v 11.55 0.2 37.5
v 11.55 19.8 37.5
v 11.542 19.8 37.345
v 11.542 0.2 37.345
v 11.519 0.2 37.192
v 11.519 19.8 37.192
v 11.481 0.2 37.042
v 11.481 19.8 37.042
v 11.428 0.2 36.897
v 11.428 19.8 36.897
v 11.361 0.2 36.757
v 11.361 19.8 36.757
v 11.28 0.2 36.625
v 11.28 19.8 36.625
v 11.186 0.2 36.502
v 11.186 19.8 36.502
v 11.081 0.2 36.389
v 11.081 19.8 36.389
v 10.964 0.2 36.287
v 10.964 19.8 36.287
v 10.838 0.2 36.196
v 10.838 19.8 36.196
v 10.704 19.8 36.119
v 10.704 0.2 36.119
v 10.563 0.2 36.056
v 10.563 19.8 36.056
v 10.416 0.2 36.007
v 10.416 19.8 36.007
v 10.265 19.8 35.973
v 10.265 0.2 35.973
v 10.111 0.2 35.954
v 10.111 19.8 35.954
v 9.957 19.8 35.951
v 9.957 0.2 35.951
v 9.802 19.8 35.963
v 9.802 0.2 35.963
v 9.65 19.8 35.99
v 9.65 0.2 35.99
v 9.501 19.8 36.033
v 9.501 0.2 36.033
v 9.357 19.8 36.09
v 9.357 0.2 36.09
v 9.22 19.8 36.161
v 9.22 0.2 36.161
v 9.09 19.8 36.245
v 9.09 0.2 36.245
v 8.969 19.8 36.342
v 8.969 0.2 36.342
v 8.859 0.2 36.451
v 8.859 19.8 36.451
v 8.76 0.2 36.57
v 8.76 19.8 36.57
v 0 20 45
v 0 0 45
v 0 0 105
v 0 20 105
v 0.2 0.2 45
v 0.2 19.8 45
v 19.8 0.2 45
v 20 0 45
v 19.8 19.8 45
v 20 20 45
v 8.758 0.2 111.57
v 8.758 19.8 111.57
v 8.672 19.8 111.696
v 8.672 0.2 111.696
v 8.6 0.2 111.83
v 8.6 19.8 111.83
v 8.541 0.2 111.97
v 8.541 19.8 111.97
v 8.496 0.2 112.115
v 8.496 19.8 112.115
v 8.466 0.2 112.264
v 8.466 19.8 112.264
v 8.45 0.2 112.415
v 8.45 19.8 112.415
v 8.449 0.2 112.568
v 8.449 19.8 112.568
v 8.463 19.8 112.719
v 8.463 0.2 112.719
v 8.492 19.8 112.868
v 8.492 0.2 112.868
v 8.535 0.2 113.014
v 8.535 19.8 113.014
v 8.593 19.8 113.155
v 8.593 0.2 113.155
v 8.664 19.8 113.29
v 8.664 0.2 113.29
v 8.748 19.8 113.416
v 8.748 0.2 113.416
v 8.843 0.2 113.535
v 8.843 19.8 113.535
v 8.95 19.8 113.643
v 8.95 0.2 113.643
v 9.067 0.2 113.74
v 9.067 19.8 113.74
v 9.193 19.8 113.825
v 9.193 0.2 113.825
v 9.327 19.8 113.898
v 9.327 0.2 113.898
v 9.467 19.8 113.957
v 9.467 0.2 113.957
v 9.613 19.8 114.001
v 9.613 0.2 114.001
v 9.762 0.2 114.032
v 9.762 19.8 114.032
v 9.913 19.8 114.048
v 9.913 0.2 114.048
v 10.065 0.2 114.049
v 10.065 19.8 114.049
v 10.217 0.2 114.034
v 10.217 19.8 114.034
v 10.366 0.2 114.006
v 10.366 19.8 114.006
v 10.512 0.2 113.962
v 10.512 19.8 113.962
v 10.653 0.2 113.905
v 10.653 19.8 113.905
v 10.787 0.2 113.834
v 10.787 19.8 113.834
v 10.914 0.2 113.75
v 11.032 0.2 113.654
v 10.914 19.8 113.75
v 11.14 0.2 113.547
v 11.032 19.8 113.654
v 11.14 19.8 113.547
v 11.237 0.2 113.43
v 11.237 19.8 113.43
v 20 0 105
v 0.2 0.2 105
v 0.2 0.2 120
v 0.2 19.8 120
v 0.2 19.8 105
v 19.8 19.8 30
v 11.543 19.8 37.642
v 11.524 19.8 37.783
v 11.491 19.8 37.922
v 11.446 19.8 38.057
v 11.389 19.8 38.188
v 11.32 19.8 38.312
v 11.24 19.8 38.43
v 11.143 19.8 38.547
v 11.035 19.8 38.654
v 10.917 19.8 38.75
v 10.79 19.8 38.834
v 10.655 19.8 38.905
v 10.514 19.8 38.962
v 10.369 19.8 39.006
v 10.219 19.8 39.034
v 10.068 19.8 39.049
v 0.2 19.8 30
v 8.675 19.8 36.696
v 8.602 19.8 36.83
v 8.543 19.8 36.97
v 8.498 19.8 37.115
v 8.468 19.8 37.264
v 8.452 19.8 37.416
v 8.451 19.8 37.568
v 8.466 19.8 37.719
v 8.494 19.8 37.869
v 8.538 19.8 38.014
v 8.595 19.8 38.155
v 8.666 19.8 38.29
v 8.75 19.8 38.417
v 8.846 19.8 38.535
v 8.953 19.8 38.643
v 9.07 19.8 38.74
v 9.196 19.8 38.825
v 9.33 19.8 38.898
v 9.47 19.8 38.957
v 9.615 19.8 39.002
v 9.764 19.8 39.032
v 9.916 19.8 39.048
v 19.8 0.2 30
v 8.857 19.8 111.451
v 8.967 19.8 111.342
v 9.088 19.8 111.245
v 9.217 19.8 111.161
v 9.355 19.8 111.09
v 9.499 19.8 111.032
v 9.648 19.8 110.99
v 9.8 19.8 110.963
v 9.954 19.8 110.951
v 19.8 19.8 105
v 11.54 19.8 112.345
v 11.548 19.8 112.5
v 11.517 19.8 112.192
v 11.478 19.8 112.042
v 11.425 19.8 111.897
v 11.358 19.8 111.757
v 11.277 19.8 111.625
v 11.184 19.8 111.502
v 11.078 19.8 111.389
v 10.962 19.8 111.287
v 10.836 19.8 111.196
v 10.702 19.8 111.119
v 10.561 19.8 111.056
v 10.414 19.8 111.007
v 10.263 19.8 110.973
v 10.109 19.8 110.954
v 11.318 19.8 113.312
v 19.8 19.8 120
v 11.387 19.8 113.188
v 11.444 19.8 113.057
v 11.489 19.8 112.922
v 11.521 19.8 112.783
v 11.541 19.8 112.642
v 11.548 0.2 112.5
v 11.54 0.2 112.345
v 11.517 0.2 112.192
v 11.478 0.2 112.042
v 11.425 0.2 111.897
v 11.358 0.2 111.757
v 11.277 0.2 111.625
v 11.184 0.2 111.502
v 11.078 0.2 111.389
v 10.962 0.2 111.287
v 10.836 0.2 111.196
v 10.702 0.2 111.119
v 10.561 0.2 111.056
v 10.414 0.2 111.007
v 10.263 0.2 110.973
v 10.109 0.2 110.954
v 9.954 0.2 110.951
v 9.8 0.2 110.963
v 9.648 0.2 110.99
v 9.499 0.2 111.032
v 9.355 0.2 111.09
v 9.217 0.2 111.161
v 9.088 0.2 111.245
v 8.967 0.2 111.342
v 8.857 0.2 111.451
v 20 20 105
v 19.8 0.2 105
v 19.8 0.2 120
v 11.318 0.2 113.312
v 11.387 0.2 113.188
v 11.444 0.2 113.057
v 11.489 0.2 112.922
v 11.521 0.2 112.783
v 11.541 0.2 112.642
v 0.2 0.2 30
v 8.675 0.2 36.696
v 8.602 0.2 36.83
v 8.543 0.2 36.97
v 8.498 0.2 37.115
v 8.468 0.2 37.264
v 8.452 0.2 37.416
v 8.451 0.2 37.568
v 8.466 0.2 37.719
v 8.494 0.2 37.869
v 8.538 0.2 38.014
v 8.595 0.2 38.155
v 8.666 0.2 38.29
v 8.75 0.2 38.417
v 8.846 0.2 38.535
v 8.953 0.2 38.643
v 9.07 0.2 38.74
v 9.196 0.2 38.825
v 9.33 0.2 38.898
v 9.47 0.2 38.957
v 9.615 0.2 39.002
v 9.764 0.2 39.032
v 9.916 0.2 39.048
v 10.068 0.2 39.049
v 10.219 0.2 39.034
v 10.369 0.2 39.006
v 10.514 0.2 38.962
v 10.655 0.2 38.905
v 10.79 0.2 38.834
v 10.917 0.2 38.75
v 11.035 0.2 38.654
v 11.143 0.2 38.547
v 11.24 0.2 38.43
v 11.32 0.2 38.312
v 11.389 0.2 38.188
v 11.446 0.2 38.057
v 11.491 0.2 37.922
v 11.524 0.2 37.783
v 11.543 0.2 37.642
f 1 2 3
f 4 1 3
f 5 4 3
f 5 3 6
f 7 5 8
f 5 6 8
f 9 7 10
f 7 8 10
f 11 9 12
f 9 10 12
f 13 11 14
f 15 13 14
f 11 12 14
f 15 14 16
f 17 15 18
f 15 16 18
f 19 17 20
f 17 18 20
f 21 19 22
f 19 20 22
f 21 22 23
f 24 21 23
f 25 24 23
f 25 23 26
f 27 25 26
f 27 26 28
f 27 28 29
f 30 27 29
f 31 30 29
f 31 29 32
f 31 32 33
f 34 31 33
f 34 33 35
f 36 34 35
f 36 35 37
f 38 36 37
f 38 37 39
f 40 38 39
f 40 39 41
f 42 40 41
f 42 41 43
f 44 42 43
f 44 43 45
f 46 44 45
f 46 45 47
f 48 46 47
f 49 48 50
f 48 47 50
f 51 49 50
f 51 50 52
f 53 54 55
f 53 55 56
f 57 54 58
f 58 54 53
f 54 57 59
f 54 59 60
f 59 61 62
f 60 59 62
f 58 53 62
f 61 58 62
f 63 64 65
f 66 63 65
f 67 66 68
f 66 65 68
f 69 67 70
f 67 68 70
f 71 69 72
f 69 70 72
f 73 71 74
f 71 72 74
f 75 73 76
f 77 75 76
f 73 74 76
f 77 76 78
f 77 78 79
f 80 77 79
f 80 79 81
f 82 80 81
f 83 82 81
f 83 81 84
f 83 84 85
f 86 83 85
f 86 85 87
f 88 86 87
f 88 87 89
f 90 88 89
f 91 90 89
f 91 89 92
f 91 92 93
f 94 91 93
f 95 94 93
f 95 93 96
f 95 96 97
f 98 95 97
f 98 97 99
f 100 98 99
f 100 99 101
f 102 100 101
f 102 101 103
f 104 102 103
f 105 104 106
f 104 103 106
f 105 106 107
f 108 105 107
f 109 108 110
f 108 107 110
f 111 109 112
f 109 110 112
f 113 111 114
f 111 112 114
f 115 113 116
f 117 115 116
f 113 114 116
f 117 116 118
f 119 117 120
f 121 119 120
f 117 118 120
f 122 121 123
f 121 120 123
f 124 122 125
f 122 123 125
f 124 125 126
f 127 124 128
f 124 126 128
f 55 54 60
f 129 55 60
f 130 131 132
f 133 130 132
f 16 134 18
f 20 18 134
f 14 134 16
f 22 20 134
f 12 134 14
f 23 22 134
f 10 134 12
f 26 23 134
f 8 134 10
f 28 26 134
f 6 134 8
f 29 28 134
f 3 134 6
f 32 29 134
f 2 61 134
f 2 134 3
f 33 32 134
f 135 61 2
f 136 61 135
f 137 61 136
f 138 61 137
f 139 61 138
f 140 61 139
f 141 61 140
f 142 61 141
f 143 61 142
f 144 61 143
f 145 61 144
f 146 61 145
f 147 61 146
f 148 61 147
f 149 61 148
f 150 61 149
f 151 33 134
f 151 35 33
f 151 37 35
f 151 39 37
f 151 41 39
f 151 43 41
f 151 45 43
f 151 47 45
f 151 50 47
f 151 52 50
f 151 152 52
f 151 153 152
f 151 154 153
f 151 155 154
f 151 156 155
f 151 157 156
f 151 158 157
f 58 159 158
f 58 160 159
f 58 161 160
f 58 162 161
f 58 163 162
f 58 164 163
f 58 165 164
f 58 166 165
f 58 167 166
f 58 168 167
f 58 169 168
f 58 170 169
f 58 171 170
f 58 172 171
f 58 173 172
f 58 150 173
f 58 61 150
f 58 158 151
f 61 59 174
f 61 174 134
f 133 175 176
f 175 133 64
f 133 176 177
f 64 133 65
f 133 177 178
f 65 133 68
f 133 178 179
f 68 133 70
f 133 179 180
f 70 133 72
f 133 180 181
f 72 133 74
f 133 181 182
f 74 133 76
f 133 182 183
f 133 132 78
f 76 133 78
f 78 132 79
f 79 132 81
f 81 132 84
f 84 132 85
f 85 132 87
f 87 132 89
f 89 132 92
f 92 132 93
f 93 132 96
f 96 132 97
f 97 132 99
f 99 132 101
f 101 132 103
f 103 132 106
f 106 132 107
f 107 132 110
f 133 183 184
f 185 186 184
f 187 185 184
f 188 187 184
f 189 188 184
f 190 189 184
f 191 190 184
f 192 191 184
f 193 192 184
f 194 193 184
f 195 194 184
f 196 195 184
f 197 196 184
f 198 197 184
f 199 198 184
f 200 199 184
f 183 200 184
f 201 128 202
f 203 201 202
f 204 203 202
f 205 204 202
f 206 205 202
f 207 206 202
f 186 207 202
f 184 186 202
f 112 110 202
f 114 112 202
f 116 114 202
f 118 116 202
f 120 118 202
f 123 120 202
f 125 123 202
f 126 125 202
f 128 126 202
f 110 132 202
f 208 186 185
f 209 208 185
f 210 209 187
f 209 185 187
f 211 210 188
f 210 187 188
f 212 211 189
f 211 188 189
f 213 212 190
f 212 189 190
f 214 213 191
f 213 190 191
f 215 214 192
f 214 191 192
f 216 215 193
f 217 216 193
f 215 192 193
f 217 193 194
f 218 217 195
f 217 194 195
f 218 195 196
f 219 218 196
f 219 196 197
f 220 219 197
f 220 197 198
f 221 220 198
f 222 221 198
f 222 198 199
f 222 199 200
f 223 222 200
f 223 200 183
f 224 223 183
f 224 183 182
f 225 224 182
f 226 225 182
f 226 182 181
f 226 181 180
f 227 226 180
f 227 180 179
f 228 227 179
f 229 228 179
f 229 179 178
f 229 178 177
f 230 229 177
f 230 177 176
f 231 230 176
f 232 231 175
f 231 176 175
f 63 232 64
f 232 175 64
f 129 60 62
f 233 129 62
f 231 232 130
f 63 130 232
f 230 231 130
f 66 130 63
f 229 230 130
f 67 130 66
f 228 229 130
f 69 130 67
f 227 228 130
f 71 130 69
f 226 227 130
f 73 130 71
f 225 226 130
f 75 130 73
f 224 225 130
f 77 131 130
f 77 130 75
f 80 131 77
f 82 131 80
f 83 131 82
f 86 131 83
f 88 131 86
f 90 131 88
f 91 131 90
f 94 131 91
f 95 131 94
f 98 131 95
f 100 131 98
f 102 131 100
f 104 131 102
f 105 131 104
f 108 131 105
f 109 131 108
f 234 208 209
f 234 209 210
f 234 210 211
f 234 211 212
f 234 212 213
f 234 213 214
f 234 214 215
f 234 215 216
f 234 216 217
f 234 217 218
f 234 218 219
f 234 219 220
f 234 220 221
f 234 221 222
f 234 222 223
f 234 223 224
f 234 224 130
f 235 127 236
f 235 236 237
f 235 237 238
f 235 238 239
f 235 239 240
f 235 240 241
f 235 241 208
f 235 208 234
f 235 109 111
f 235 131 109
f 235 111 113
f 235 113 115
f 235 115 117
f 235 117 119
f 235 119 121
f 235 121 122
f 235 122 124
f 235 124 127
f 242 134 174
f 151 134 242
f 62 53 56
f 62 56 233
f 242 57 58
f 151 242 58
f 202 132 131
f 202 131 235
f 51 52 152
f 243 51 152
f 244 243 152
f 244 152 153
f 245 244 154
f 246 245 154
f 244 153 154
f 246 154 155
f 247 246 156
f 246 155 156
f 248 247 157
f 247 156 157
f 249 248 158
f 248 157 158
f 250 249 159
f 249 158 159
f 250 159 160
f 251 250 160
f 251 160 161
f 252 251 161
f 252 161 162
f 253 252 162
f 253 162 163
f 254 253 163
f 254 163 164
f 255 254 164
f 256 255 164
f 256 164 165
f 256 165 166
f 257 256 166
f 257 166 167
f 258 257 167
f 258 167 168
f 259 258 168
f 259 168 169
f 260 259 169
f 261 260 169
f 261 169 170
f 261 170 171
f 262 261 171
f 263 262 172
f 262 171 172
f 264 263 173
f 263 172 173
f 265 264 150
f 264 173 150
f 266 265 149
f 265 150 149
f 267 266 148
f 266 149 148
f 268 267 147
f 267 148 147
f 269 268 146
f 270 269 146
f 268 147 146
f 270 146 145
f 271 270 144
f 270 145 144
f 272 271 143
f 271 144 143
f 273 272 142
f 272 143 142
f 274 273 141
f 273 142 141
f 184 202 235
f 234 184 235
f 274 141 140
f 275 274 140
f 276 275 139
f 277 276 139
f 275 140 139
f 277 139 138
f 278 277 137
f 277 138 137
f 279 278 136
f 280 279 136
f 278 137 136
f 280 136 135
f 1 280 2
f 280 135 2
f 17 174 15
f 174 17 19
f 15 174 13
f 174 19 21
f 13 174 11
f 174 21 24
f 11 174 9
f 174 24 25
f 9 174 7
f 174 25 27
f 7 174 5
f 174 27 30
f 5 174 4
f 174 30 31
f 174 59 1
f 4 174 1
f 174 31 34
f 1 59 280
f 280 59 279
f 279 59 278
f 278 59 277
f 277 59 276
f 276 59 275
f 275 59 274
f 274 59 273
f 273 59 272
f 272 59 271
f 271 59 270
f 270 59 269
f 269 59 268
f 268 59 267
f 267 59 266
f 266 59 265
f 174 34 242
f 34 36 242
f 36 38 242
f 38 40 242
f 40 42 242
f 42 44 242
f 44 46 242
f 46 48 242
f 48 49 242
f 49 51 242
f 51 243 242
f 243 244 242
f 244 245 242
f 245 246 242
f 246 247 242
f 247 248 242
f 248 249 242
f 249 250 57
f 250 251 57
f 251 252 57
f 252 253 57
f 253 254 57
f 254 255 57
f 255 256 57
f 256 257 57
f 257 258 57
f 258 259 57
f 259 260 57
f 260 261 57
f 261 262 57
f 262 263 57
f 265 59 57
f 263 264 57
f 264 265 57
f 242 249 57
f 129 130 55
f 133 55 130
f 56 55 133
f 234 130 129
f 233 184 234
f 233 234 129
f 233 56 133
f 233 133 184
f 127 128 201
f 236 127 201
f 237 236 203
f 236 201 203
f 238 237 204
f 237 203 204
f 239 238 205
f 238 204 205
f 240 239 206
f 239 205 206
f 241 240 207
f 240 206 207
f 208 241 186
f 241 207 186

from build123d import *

# Parameters (mm, degrees)
SKETCH_1_W          = 20
SKETCH_1_H          = 20
EXTRUDE_1_DEPTH     = 120
SKETCH_2_W          = 10
SKETCH_2_H          = 20
CUT_EXTRUDE_1_DEPTH = 120
CUT_EXTRUDE_2_DEPTH = 120
SKETCH_4_R          = 3
CUT_EXTRUDE_3_DEPTH = 2
SKETCH_8_W          = 19.6
SKETCH_8_H          = 0.2
SKETCH_8_W_2        = 0.2
SKETCH_8_H_2        = 19.6
CUT_EXTRUDE_6_DEPTH = 15
SKETCH_9_W          = 10
SKETCH_9_H          = 20
CUT_EXTRUDE_7_DEPTH = 20
SKETCH_10_W         = 19.6
SKETCH_10_H         = 19.6
EXTRUDE_2_DEPTH     = 15
CUT_EXTRUDE_8_DEPTH = 20
CUT_EXTRUDE_9_DEPTH = 20


with BuildPart() as part:
    # 草图1 → 凸台-拉伸1 (new body)
    with BuildSketch(Plane.XY):
        with Locations((10, 10)):
            Rectangle(SKETCH_1_W, SKETCH_1_H)
    extrude(amount=EXTRUDE_1_DEPTH)

    # 草图2 → 切除-拉伸1 (cut)
    with BuildSketch(Plane(origin=(0, 20, 0), x_dir=(1, 0, 0), z_dir=(0, 1, 0))):
        with Locations((15, -10)):
            Rectangle(SKETCH_2_W, SKETCH_2_H)
    extrude(amount=-CUT_EXTRUDE_1_DEPTH, mode=Mode.SUBTRACT)

    # 草图3 → 切除-拉伸2 (cut)
    with BuildSketch(Plane(origin=(10, 0, 0), x_dir=(0, 0, -1), z_dir=(1, 0, 0))):
        with BuildLine():
            ThreePointArc((-8.45, 10), (-9.40684068, 11.432013275), (-11.096015511, 11.096015511))
            Line((-11.096015511, 11.096015511), (-8.903984489, 8.903984489))
            ThreePointArc((-8.903984489, 8.903984489), (-8.567986725, 9.40684068), (-8.45, 10))
        make_face()
        with BuildLine():
            Line((-8.903984489, 8.903984489), (-11.096015511, 11.096015511))
            ThreePointArc((-11.096015511, 11.096015511), (-11.096015511, 8.903984489), (-8.903984489, 8.903984489))
        make_face()
    extrude(amount=-CUT_EXTRUDE_2_DEPTH, mode=Mode.SUBTRACT)

    # 草图4 → 切除-拉伸3 (cut)
    with BuildSketch(Plane.ZY):
        with Locations((10, 10)):
            Circle(SKETCH_4_R)
    extrude(amount=-CUT_EXTRUDE_3_DEPTH, mode=Mode.SUBTRACT)

    # 草图8 → 切除-拉伸6 (cut)
    with BuildSketch(Plane.XY.offset(120)):
        with Locations((10, 19.9)):
            Rectangle(SKETCH_8_W, SKETCH_8_H)
        with Locations((0.1, 19.9)):
            Rectangle(SKETCH_8_W_2, SKETCH_8_H)
        with Locations((0.1, 10)):
            Rectangle(SKETCH_8_W_2, SKETCH_8_H_2)
        with Locations((19.9, 10)):
            Rectangle(SKETCH_8_W_2, SKETCH_8_H_2)
        with Locations((19.9, 0.1)):
            Rectangle(SKETCH_8_W_2, SKETCH_8_H)
        with Locations((10, 0.1)):
            Rectangle(SKETCH_8_W, SKETCH_8_H)
        with Locations((0.1, 0.1)):
            Rectangle(SKETCH_8_W_2, SKETCH_8_H)
        with Locations((19.9, 19.9)):
            Rectangle(SKETCH_8_W_2, SKETCH_8_H)
    extrude(amount=-CUT_EXTRUDE_6_DEPTH, mode=Mode.SUBTRACT)

    # 草图9 → 切除-拉伸7 (cut)
    with BuildSketch(Plane(origin=(0, 20, 0), x_dir=(1, 0, 0), z_dir=(0, 1, 0))):
        Polygon((0, 0), (0, -45), (20, -45), (20, -20), (10, -20), (10, 0), align=None)
        with Locations((15, -10)):
            Rectangle(SKETCH_9_W, SKETCH_9_H)
    extrude(amount=-CUT_EXTRUDE_7_DEPTH, mode=Mode.SUBTRACT)

    # 草图10 → 凸台-拉伸2 (add)
    with BuildSketch(Plane(origin=(0, 0, 45), x_dir=(-1, 0, 0), z_dir=(0, 0, -1))):
        with Locations((-10, 10)):
            Rectangle(SKETCH_10_W, SKETCH_10_H)
    extrude(amount=EXTRUDE_2_DEPTH)

    # 草图11 → 切除-拉伸8 (cut)
    with BuildSketch(Plane(origin=(0, 19.8, 0), x_dir=(1, 0, 0), z_dir=(0, 1, 0))):
        with BuildLine():
            ThreePointArc((11.547573501, -112.5), (10.487812185, -111.029569439), (8.757681845, -111.569855559))
            Line((8.757681845, -111.569855559), (11.237465157, -113.430144441))
            ThreePointArc((11.237465157, -113.430144441), (11.468004062, -112.990238683), (11.547573501, -112.5))
        make_face()
        with BuildLine():
            Line((11.237465157, -113.430144441), (8.757681845, -111.569855559))
            ThreePointArc((8.757681845, -111.569855559), (9.06742906, -113.739891656), (11.237465157, -113.430144441))
        make_face()
    extrude(amount=-CUT_EXTRUDE_8_DEPTH, mode=Mode.SUBTRACT)

    # 草图12 → 切除-拉伸9 (cut)
    with BuildSketch(Plane(origin=(0, 19.8, 0), x_dir=(1, 0, 0), z_dir=(0, 1, 0))):
        with BuildLine():
            ThreePointArc((11.55, -37.5), (10.490153037, -36.029540888), (8.76, -36.57))
            Line((8.76, -36.57), (11.24, -38.43))
            ThreePointArc((11.24, -38.43), (11.470459112, -37.990153037), (11.55, -37.5))
        make_face()
        with BuildLine():
            Line((11.24, -38.43), (8.76, -36.57))
            ThreePointArc((8.76, -36.57), (9.07, -38.74), (11.24, -38.43))
        make_face()
    extrude(amount=-CUT_EXTRUDE_9_DEPTH, mode=Mode.SUBTRACT)


solid = part.part
